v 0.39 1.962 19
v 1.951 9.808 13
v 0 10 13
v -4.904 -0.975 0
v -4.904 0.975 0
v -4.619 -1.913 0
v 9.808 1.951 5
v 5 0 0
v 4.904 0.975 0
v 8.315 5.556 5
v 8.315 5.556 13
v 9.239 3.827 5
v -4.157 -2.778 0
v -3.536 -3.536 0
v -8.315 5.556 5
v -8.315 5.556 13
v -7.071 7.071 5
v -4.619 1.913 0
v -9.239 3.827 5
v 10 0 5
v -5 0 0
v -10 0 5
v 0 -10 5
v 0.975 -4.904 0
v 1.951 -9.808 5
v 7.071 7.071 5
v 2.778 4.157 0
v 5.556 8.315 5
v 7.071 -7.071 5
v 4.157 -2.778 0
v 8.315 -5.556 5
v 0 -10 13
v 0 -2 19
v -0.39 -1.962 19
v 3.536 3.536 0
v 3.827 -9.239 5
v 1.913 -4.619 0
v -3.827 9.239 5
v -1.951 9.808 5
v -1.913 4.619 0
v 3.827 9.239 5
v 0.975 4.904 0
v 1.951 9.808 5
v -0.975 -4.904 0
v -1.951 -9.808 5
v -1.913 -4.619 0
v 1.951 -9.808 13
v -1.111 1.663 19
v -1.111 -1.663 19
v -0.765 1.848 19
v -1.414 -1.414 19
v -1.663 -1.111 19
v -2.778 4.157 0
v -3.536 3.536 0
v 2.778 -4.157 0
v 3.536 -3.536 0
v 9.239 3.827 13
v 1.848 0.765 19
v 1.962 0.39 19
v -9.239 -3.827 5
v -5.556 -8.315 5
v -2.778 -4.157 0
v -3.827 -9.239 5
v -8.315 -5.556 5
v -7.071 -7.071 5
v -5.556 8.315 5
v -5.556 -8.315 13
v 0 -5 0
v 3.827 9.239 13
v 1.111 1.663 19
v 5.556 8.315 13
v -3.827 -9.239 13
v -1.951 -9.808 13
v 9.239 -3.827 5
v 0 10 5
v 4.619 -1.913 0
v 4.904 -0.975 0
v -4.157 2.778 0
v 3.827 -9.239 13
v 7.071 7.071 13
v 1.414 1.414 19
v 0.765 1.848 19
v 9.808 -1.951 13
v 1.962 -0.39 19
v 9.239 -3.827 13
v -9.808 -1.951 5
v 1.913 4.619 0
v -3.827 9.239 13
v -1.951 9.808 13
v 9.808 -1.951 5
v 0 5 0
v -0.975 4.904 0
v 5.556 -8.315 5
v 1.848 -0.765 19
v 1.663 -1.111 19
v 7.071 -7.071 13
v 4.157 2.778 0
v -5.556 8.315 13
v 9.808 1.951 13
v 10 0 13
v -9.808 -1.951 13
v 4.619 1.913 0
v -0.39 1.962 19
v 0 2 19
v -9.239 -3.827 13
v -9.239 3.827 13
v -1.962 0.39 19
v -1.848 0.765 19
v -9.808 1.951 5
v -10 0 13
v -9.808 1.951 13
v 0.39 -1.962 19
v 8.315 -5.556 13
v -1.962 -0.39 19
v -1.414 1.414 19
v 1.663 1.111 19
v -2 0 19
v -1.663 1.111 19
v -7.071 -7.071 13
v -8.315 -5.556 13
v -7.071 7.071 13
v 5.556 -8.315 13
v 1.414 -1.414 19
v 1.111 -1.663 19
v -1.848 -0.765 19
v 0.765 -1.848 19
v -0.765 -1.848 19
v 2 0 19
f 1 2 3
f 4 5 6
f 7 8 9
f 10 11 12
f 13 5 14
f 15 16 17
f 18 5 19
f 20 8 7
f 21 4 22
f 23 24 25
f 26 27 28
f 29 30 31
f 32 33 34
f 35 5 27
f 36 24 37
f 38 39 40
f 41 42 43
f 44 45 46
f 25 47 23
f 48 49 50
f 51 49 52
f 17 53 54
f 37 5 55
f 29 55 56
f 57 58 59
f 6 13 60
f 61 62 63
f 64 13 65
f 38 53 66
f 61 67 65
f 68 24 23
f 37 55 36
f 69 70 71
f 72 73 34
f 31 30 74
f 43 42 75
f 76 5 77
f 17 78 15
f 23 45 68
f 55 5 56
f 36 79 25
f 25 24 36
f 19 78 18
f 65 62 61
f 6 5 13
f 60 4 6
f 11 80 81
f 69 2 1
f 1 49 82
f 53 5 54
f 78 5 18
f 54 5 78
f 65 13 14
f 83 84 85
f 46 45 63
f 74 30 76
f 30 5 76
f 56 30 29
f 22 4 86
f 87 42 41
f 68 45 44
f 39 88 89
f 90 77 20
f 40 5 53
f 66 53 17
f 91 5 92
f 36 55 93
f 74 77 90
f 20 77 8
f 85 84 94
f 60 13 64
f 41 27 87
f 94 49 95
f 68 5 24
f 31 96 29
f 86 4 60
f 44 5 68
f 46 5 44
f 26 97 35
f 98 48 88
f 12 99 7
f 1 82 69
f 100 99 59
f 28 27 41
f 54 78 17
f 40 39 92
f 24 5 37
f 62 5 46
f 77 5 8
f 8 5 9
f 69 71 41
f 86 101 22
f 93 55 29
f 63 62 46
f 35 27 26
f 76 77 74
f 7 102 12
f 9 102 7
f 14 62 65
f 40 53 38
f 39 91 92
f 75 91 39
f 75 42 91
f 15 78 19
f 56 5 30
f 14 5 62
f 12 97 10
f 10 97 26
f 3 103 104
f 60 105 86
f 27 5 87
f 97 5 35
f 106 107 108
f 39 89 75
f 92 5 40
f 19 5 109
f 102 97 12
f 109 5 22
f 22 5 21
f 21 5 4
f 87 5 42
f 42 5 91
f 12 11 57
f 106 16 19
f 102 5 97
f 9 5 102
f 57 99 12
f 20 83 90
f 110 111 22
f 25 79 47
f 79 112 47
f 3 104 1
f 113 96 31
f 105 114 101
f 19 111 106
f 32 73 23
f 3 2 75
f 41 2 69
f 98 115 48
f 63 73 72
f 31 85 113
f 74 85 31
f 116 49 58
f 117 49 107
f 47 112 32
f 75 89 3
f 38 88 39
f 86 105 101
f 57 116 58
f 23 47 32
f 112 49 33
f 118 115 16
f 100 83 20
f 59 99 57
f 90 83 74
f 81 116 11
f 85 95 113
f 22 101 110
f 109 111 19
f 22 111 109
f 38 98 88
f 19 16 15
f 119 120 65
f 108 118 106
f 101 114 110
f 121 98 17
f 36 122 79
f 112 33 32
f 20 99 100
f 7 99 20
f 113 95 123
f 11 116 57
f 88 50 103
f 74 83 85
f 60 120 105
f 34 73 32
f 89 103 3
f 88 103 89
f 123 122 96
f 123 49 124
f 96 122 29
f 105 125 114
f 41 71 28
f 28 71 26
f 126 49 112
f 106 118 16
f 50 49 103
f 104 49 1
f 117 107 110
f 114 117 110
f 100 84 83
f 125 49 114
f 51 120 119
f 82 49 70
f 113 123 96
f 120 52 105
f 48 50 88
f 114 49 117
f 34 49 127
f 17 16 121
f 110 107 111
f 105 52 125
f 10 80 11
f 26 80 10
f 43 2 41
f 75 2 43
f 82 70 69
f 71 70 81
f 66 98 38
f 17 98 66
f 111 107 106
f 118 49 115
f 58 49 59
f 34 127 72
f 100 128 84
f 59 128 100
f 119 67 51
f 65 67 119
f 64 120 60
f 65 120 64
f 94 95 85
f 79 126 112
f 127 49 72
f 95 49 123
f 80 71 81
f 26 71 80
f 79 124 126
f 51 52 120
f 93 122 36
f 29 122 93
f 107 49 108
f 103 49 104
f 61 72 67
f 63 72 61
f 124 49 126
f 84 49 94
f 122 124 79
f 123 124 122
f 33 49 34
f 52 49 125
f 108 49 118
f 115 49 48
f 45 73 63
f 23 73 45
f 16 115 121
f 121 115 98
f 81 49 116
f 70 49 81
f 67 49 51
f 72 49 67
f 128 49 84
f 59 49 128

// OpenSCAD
// Test: Colinear cylinders along Z-axis
$fn = 32; // low resolution for testing

hull() {
    // Cylinder 1: height 5, radius 5
    cylinder(h = 5, r1 = 5, r2 = 5, center = false);

    // Cylinder 2: height 8, radius 10, offset in Z
    translate([0, 0, 5])
        cylinder(h = 8, r1 = 10, r2 = 10, center = false);

    // Cylinder 3: height 6, radius 2, further offset in Z
    translate([0, 0, 13])
        cylinder(h = 6, r1 = 2, r2 = 2, center = false);
}
